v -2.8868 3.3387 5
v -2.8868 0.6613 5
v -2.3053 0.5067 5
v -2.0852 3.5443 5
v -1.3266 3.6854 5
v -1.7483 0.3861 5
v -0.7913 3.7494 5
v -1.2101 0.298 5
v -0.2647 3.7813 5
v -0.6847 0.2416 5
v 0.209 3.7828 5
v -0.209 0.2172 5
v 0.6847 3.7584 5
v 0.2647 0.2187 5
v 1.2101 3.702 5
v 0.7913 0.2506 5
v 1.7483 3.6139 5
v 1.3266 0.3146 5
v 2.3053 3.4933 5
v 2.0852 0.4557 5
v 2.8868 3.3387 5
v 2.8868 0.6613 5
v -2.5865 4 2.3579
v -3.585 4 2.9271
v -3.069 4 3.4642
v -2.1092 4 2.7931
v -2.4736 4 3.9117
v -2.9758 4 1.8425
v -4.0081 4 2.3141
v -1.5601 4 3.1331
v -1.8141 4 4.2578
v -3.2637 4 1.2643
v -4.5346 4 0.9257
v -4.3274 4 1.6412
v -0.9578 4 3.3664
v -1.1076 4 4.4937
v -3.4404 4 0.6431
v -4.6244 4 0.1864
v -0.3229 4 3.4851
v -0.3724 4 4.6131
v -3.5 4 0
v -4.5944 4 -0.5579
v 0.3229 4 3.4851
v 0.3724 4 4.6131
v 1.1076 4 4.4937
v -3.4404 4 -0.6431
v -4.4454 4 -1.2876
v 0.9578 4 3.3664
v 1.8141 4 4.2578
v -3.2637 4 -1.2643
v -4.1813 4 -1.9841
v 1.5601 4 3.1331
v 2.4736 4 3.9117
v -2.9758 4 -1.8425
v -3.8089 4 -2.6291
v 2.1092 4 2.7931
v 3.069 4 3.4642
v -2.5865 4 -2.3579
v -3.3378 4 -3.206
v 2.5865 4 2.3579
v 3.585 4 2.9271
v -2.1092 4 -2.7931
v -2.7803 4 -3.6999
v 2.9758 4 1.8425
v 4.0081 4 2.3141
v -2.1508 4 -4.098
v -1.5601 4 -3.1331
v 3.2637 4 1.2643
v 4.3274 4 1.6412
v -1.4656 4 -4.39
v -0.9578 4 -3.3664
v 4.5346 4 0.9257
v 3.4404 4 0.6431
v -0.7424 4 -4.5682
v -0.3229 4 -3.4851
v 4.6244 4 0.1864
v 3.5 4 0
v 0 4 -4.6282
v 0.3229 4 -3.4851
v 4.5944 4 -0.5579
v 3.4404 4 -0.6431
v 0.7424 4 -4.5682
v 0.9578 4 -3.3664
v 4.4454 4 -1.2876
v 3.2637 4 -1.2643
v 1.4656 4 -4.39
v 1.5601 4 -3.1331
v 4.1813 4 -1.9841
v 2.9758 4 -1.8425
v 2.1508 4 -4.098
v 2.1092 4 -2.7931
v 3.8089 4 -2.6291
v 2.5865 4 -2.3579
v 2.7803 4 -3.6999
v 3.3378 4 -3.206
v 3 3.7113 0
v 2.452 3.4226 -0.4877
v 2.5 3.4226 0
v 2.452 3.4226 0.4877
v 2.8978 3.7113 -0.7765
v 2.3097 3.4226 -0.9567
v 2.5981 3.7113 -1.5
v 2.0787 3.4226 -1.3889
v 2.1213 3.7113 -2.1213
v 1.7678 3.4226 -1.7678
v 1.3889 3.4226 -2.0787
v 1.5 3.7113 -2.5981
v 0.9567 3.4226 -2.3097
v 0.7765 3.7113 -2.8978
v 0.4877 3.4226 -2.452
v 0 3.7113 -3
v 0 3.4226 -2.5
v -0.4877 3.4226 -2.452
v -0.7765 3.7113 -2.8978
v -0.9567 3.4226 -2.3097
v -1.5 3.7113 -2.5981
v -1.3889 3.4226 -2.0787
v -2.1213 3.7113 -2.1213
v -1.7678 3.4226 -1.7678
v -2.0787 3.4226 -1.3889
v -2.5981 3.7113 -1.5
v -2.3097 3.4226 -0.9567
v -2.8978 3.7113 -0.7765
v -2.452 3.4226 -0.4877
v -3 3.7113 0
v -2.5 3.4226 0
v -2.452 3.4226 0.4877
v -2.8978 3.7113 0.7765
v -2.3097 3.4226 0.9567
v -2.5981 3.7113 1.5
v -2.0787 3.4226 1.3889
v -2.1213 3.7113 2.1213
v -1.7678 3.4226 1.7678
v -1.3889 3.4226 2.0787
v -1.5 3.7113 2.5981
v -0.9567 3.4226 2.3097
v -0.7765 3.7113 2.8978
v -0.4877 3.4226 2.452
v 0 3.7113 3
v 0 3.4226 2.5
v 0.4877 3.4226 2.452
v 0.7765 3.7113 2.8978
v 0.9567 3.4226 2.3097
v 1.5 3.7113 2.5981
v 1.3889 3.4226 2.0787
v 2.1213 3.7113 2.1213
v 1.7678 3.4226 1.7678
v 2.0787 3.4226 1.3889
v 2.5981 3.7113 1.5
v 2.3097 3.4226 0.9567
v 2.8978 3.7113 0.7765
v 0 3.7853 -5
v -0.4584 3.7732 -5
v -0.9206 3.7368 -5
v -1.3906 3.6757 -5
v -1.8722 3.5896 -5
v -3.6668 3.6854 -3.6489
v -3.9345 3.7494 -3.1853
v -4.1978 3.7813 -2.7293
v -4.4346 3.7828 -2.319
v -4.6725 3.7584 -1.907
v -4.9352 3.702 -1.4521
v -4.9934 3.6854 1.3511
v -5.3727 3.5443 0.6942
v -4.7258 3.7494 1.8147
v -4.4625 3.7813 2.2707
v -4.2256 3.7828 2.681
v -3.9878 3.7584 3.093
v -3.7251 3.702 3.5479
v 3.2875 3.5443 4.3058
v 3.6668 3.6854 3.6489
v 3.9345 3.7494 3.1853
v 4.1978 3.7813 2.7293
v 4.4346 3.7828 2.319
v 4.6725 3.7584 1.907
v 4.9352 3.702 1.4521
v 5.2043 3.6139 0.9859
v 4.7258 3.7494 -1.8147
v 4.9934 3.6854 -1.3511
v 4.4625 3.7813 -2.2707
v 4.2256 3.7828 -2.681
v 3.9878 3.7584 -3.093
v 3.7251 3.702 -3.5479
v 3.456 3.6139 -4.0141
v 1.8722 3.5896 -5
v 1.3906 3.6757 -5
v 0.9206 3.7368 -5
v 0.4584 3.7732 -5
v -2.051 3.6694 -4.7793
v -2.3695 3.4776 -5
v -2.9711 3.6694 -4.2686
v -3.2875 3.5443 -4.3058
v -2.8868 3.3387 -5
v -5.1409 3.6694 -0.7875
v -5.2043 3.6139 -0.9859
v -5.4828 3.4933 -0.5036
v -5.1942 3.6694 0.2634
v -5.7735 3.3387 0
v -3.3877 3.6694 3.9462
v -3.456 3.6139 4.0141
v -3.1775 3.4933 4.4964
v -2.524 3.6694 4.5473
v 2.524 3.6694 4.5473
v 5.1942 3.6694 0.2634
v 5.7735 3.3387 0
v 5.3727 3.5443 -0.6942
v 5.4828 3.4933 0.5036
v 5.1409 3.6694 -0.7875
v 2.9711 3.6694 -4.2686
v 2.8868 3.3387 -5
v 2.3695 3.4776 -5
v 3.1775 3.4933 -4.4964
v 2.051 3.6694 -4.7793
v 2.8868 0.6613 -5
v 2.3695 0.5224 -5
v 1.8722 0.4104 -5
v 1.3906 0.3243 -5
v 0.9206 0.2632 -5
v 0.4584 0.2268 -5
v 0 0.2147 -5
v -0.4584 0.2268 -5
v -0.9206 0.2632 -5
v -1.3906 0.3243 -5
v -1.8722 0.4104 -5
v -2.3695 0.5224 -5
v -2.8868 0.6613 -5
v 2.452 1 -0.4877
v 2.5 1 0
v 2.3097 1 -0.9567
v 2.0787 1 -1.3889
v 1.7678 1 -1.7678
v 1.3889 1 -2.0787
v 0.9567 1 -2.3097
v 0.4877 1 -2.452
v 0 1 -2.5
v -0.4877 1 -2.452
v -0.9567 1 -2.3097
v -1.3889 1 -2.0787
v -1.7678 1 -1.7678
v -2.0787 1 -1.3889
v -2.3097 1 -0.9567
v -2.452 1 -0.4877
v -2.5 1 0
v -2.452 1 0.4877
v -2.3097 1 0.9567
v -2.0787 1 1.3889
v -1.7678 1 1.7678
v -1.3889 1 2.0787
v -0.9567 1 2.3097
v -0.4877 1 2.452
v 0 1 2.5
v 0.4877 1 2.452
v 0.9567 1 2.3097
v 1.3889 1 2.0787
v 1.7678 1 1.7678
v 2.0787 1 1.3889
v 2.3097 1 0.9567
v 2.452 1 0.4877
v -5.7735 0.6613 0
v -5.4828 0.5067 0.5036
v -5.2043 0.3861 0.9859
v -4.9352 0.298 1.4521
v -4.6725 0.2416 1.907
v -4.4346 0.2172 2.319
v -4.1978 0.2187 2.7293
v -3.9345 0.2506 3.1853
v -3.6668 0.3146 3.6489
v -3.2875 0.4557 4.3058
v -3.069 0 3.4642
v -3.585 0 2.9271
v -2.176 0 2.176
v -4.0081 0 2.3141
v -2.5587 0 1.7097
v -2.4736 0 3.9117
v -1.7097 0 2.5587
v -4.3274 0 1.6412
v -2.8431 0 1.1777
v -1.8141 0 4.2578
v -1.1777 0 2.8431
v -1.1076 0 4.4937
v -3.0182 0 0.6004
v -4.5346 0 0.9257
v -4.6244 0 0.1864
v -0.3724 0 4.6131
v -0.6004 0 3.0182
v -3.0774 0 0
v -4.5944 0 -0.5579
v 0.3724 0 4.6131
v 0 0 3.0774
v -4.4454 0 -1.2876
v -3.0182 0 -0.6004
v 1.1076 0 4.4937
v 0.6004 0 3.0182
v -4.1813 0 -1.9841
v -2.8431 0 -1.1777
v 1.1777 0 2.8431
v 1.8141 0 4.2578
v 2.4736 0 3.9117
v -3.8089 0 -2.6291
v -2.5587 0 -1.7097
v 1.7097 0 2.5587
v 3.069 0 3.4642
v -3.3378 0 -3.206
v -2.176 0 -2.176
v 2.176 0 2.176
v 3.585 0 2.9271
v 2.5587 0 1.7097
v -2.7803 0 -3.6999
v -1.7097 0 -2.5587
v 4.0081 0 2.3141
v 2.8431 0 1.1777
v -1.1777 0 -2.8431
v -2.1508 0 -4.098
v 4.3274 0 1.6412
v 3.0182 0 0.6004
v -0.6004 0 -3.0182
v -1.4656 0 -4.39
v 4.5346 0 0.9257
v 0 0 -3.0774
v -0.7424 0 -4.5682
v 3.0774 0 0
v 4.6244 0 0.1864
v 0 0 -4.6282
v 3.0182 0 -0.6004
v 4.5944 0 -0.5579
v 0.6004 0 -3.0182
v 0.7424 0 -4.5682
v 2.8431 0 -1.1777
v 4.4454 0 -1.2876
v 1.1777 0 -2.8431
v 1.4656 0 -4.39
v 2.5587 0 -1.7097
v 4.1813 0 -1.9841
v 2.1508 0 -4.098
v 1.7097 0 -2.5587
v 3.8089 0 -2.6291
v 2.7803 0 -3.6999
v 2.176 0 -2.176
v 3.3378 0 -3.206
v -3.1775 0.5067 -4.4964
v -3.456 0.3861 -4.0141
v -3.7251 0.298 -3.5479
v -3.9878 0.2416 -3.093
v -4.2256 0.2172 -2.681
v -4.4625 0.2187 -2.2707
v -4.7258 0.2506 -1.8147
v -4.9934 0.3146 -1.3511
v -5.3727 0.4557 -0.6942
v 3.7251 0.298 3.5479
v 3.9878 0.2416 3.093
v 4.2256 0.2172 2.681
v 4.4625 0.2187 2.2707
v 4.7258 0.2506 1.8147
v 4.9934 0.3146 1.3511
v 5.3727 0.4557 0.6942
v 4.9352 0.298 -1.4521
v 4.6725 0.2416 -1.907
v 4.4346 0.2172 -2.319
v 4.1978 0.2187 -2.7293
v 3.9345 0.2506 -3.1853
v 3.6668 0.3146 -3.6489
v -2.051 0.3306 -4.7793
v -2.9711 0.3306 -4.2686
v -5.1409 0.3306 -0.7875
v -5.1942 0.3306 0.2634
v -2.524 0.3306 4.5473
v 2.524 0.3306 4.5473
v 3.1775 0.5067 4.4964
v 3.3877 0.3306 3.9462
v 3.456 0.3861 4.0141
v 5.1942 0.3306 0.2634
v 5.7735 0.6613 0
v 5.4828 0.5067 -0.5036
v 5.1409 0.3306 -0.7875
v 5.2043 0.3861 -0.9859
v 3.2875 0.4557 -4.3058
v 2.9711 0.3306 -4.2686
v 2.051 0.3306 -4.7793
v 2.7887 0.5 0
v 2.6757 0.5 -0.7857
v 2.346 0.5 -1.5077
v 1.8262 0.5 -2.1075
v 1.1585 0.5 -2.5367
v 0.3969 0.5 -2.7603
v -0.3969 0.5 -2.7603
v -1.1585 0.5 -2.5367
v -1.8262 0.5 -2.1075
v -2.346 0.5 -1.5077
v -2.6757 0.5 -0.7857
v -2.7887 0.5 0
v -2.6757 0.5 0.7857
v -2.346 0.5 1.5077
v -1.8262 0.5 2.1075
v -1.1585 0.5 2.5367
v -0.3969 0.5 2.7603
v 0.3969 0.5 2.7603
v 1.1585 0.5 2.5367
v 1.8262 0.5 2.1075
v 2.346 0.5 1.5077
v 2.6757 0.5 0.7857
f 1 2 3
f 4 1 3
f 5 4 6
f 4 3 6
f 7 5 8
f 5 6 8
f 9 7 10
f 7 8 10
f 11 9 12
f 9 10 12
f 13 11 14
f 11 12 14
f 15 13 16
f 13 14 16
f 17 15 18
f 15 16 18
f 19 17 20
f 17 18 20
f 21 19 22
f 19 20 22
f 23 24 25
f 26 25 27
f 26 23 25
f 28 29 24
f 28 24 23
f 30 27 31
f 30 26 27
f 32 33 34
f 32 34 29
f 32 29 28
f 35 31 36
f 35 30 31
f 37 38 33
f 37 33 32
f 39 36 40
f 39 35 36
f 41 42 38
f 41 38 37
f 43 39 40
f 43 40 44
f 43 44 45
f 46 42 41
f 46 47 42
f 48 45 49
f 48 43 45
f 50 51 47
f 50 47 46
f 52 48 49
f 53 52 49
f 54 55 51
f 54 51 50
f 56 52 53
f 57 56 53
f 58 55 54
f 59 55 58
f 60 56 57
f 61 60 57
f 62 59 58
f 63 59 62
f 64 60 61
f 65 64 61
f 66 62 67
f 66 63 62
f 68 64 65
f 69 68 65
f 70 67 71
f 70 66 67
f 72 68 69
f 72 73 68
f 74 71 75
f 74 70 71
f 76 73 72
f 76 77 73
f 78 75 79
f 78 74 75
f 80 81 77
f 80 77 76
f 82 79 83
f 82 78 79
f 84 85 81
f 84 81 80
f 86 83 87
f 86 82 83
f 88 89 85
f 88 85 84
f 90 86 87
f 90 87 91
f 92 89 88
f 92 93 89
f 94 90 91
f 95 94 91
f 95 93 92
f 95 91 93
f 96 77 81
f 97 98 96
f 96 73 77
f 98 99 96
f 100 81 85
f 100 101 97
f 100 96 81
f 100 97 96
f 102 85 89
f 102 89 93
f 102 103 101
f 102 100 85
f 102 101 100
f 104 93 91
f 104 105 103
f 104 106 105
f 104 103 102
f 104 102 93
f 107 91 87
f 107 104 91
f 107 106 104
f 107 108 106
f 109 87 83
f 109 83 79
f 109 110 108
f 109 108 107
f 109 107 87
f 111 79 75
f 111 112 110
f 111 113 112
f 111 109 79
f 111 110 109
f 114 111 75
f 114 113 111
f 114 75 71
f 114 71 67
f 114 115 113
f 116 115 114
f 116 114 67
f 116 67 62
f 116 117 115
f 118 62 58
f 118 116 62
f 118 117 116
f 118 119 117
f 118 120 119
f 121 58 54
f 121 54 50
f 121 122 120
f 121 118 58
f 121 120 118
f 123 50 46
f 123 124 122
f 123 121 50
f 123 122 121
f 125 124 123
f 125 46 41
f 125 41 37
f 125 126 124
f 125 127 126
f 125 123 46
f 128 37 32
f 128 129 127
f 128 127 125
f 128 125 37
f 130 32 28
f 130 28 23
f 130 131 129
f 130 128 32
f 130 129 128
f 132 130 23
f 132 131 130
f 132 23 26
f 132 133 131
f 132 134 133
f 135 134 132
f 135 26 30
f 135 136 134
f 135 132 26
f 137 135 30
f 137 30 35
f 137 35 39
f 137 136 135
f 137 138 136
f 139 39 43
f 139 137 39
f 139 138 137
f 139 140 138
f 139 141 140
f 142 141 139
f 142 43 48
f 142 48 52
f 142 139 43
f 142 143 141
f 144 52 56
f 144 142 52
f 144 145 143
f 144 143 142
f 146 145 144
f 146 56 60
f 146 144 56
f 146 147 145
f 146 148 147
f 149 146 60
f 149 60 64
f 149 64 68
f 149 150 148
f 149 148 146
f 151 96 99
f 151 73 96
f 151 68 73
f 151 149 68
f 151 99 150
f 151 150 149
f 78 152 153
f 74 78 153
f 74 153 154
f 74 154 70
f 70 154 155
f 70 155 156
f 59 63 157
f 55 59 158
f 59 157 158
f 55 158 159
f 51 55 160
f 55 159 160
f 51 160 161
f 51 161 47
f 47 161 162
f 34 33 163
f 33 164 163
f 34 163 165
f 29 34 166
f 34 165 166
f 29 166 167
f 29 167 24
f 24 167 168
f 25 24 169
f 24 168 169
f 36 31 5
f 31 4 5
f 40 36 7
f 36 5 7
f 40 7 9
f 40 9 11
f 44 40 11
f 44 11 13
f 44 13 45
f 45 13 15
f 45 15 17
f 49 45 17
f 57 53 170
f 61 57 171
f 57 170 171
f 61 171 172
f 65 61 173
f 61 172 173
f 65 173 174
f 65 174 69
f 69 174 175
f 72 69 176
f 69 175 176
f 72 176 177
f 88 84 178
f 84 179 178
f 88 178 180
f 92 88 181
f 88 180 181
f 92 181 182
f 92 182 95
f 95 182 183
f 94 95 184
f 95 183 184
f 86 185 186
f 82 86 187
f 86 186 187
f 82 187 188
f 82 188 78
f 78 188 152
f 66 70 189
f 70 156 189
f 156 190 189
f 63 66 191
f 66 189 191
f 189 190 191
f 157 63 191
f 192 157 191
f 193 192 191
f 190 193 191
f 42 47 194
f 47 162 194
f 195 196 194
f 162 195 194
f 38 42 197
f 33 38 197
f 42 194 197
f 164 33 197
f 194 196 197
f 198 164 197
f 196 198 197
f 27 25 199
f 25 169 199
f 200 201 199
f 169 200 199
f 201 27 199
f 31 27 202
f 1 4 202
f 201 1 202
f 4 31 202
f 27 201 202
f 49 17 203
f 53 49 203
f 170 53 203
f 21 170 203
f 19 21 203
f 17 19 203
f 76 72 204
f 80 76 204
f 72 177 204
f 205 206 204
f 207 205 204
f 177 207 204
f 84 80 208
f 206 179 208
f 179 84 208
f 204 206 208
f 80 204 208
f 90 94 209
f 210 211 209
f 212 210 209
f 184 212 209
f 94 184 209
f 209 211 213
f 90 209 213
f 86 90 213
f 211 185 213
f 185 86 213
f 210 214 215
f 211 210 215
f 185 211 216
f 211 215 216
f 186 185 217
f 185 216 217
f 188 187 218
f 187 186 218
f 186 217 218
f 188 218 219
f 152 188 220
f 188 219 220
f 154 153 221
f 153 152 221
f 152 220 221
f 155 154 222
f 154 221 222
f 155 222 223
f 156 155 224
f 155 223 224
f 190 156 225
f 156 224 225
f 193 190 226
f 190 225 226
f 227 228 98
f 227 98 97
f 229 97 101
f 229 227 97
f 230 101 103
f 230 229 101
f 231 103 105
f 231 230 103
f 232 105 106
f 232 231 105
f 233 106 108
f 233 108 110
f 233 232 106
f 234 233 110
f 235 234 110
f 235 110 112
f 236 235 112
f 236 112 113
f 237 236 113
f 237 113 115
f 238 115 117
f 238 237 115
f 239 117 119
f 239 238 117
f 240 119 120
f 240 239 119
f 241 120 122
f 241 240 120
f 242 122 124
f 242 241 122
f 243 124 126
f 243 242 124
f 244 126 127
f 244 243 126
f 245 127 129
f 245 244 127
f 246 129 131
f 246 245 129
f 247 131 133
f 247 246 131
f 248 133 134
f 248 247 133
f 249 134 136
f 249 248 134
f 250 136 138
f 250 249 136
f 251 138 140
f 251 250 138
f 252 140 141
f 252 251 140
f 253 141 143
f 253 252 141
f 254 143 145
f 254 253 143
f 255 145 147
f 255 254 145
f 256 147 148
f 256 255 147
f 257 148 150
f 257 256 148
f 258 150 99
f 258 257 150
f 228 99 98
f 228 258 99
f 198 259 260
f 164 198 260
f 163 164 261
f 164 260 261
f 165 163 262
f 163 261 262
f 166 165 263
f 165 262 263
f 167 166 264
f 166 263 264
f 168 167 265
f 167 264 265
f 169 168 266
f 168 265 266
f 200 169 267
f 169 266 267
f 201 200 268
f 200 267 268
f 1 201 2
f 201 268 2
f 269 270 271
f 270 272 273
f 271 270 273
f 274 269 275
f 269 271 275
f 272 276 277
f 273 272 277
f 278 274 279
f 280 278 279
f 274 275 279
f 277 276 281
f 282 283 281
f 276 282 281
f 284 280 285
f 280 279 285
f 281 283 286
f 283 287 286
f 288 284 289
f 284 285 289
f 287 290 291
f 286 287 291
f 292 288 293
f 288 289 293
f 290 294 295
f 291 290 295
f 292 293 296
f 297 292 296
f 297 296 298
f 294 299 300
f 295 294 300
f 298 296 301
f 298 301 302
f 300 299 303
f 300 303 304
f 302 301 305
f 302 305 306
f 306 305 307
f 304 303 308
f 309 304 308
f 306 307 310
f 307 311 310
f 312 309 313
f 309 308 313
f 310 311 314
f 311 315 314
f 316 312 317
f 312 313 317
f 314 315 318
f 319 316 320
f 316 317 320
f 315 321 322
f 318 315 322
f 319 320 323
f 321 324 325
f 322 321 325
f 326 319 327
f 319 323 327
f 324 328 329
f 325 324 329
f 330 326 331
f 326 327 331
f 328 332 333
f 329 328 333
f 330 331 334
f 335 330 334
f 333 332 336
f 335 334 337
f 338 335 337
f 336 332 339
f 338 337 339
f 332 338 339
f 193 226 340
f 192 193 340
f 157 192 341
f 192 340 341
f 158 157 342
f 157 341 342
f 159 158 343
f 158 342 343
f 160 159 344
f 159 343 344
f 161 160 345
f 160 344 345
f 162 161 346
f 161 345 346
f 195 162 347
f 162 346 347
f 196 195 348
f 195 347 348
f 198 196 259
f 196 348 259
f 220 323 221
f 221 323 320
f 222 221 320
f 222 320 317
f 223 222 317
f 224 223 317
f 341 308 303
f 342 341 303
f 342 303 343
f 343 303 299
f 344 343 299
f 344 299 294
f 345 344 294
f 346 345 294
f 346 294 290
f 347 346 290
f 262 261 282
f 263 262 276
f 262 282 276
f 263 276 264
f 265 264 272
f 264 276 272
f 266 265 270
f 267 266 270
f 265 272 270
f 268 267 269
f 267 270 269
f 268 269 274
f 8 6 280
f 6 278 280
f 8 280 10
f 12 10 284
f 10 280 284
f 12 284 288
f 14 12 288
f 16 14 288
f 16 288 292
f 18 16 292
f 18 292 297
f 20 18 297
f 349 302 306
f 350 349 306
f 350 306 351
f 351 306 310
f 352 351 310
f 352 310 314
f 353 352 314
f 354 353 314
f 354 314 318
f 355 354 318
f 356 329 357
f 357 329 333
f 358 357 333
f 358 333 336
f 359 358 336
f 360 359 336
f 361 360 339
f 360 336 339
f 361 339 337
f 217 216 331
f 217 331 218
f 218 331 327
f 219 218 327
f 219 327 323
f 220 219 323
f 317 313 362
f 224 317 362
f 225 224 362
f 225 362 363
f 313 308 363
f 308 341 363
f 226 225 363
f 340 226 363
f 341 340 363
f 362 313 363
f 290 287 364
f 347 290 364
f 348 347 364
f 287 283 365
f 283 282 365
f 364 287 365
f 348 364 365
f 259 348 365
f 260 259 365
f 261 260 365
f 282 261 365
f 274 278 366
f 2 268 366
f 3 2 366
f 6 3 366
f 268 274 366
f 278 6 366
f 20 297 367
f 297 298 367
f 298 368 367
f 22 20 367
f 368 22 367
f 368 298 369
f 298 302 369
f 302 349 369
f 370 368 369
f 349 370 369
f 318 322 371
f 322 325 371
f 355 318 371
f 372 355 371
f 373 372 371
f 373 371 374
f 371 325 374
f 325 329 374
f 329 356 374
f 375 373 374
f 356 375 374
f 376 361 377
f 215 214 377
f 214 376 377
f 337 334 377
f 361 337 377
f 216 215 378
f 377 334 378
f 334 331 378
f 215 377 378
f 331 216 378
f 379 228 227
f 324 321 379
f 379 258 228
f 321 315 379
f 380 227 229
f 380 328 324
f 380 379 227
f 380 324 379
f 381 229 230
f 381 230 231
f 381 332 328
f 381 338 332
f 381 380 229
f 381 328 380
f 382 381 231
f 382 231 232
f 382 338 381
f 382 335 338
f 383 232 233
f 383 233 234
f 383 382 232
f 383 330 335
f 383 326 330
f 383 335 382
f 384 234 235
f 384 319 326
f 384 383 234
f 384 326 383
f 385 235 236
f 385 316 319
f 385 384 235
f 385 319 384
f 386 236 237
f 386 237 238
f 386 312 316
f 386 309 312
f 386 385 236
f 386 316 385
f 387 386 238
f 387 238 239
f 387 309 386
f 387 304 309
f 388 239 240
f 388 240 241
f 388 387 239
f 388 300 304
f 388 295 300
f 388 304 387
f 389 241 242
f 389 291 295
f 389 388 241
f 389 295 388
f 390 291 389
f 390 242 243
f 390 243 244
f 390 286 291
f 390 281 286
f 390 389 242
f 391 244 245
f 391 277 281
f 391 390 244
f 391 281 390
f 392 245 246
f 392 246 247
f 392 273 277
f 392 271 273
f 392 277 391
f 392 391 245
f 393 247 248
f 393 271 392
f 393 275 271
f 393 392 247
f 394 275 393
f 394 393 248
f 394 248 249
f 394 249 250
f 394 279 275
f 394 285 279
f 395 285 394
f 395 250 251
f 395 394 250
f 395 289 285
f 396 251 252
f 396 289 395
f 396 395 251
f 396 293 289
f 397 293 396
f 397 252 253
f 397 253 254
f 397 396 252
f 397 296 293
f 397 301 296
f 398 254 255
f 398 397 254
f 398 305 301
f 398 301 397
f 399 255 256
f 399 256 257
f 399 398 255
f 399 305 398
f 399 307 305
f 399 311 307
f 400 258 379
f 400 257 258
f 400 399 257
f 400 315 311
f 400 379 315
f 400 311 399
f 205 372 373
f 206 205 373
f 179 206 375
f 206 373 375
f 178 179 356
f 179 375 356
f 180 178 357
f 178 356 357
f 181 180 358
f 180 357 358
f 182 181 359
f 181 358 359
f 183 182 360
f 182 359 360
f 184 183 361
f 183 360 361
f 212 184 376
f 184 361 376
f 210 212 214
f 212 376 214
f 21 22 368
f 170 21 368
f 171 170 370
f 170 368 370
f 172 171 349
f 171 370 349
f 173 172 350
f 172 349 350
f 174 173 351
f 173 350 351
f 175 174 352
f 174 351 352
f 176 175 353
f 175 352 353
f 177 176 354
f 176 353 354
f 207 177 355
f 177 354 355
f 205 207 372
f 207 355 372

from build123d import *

# Parameters (mm, degrees)
SKETCH_1_R             = 2.5
EXTRUDE_1_DEPTH        = 4
CHAMFER_1_SIZE         = 1
CHAMFER_1_SIZE2        = 0.577350269
CHAMFER_1_PART_2_SIZE  = 1
CHAMFER_1_PART_2_SIZE2 = 0.577350269


with BuildPart() as part:
    # Эскиз1 → Бобышка-Вытянуть1 (new body)
    with BuildSketch(Plane(origin=(0, 0, 0), x_dir=(1, 0, 0), z_dir=(0, 1, 0))):
        Polygon((-5.773502692, 0), (-2.886751346, -5), (2.886751346, -5), (5.773502692, 0), (2.886751346, 5), (-2.886751346, 5), align=None)
        Circle(SKETCH_1_R, mode=Mode.SUBTRACT)
    extrude(amount=EXTRUDE_1_DEPTH)

    # Фаска1
    chamfer_1_edges = [part.edges().sort_by_distance(p)[0] for p in [
        (-2.5, 0, 0),
    ]]
    chamfer_1_side = [part.faces().sort_by_distance(p)[0] for p in [
        (-2.5, 2, 0),
    ]]
    chamfer(chamfer_1_edges, length=CHAMFER_1_SIZE, length2=CHAMFER_1_SIZE2, reference=chamfer_1_side[0])

    # Фаска1 part 2
    chamfer_1_part_2_edges = [part.edges().sort_by_distance(p)[0] for p in [
        (-2.5, 4, 0),
    ]]
    chamfer_1_part_2_side = [part.faces().sort_by_distance(p)[0] for p in [
        (-4.197839453, 4, 2.423623738),
    ]]
    chamfer(chamfer_1_part_2_edges, length=CHAMFER_1_PART_2_SIZE, length2=CHAMFER_1_PART_2_SIZE2, reference=chamfer_1_part_2_side[0])

    # Эскиз2 → Вырез-Повернуть1 (revolve, cut)
    with BuildSketch(Plane(origin=(0, 0, 0), x_dir=(0, 0, -1), z_dir=(1, 0, 0))):
        Polygon((4.62815384, 0), (6.62815384, 0), (6.62815384, 1.154700538), align=None)
        Polygon((4.62815384, 4), (6.62815384, 2.845299462), (6.62815384, 4), align=None)
    revolve(axis=Axis((0, 0, 0), (0, 1, 0)), mode=Mode.SUBTRACT)


solid = part.part
